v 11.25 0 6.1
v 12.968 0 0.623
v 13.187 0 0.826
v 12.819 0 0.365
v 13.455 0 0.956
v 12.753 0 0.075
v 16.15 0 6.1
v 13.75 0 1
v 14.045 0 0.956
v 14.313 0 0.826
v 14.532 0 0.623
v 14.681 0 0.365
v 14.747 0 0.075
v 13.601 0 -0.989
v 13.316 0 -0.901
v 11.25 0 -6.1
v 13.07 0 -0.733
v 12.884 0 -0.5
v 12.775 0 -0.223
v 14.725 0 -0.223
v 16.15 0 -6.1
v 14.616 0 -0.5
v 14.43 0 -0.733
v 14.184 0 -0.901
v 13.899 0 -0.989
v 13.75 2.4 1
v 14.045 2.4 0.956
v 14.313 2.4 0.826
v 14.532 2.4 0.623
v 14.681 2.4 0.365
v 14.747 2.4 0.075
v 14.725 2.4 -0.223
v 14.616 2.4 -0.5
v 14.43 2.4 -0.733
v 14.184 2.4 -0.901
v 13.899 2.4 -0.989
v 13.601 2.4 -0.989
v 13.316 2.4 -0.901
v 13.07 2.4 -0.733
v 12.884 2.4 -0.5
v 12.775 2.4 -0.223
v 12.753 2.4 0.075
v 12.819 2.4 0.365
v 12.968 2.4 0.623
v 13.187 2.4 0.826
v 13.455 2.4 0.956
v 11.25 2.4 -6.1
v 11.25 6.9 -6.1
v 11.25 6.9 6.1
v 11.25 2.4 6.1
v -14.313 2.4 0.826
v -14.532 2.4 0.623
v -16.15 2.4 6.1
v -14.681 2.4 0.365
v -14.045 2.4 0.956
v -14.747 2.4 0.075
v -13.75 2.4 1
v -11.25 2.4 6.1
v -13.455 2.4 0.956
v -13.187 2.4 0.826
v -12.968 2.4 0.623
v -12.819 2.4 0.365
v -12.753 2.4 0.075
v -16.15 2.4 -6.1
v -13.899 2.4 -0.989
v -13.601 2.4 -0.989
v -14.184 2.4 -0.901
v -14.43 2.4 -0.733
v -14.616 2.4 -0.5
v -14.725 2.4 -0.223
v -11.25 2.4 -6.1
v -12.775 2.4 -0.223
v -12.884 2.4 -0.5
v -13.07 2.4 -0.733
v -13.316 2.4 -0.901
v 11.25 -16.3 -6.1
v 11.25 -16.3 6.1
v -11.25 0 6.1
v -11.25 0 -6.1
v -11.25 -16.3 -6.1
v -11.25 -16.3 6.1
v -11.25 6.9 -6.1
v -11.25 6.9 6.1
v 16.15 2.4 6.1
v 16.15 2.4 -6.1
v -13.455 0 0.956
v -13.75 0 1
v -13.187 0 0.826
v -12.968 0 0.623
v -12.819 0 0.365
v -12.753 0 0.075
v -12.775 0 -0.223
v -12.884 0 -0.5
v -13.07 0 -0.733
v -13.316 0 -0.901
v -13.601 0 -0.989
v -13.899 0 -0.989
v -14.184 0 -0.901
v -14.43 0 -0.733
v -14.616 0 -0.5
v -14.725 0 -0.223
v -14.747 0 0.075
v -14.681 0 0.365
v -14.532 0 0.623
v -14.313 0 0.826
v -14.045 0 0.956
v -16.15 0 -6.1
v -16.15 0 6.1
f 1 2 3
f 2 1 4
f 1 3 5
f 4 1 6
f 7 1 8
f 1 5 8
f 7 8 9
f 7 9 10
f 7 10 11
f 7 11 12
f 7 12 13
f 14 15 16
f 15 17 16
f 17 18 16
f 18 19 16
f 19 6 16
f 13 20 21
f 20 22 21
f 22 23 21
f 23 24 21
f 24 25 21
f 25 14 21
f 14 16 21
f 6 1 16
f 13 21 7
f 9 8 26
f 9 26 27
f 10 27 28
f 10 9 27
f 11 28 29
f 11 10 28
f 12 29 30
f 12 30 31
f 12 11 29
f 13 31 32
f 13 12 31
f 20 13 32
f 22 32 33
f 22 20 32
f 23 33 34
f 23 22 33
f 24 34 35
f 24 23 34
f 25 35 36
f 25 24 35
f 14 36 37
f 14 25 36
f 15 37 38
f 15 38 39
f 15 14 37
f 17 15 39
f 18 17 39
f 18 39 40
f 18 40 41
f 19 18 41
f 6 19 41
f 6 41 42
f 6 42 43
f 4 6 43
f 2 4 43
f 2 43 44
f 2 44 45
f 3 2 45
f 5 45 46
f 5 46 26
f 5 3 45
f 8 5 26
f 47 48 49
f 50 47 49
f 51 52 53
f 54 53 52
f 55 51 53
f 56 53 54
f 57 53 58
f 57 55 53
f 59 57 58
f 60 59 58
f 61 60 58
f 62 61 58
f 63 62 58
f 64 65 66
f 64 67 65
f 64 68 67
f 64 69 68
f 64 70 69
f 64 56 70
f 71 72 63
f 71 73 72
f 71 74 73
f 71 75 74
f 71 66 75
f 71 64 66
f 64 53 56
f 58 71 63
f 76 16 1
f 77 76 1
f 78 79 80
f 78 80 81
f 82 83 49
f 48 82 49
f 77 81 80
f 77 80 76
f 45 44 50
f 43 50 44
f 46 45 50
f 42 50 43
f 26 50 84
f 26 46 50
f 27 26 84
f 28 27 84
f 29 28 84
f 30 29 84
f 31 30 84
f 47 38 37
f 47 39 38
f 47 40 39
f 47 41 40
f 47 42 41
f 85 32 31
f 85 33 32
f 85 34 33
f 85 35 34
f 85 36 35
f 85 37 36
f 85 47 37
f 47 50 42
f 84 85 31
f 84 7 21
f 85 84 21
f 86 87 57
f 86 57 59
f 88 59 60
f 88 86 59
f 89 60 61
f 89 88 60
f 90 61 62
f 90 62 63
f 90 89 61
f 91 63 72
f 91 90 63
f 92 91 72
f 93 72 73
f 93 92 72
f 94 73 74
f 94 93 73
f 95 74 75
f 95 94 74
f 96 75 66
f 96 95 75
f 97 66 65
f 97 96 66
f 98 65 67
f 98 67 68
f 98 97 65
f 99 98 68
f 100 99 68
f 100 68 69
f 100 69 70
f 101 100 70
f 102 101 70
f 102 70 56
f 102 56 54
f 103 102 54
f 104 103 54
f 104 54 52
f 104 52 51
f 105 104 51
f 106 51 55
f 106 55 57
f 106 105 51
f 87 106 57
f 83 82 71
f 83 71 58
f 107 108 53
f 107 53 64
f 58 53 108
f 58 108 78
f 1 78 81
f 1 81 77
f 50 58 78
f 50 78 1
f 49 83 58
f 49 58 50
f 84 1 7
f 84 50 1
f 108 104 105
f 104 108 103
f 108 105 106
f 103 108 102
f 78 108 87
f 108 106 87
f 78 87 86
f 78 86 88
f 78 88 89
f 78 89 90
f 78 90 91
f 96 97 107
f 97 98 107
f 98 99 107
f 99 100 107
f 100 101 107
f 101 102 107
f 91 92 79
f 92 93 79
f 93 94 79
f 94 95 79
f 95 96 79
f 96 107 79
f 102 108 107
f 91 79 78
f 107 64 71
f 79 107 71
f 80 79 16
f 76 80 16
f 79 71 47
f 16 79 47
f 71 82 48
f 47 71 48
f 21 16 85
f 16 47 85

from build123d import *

# Parameters (mm, degrees)
SKETCH_2_W           = 32.3
SKETCH_2_H           = 12.2
SKETCH_2_R           = 1
EXTRUDE_1_DEPTH      = 2.4
EXTRUDE_2_DEPTH      = 16.3
EXTRUDE_2_DEPTH_BACK = 6.9
SKETCH_3_W           = 22.5
SKETCH_3_H           = 12.2


with BuildPart() as part:
    # 草圖2 → 填料-伸長1 (new body)
    with BuildSketch(Plane(origin=(0, 0, 0), x_dir=(1, 0, 0), z_dir=(0, 1, 0))):
        Rectangle(SKETCH_2_W, SKETCH_2_H)
        with Locations(Location((-13.75, 0, 0), (0, 0, 270))):
            Circle(SKETCH_2_R, mode=Mode.SUBTRACT)
        with Locations(Location((13.75, 0, 0), (0, 0, 270))):
            Circle(SKETCH_2_R, mode=Mode.SUBTRACT)
    extrude(amount=EXTRUDE_1_DEPTH)

    # 草圖3 → 填料-伸長2 (add, two sides: drawn at the far end of the back side and taken through both)
    with BuildSketch(Plane.XZ.offset(-EXTRUDE_2_DEPTH_BACK)):
        Rectangle(SKETCH_3_W, SKETCH_3_H)
    extrude(amount=EXTRUDE_2_DEPTH + EXTRUDE_2_DEPTH_BACK)


solid = part.part
